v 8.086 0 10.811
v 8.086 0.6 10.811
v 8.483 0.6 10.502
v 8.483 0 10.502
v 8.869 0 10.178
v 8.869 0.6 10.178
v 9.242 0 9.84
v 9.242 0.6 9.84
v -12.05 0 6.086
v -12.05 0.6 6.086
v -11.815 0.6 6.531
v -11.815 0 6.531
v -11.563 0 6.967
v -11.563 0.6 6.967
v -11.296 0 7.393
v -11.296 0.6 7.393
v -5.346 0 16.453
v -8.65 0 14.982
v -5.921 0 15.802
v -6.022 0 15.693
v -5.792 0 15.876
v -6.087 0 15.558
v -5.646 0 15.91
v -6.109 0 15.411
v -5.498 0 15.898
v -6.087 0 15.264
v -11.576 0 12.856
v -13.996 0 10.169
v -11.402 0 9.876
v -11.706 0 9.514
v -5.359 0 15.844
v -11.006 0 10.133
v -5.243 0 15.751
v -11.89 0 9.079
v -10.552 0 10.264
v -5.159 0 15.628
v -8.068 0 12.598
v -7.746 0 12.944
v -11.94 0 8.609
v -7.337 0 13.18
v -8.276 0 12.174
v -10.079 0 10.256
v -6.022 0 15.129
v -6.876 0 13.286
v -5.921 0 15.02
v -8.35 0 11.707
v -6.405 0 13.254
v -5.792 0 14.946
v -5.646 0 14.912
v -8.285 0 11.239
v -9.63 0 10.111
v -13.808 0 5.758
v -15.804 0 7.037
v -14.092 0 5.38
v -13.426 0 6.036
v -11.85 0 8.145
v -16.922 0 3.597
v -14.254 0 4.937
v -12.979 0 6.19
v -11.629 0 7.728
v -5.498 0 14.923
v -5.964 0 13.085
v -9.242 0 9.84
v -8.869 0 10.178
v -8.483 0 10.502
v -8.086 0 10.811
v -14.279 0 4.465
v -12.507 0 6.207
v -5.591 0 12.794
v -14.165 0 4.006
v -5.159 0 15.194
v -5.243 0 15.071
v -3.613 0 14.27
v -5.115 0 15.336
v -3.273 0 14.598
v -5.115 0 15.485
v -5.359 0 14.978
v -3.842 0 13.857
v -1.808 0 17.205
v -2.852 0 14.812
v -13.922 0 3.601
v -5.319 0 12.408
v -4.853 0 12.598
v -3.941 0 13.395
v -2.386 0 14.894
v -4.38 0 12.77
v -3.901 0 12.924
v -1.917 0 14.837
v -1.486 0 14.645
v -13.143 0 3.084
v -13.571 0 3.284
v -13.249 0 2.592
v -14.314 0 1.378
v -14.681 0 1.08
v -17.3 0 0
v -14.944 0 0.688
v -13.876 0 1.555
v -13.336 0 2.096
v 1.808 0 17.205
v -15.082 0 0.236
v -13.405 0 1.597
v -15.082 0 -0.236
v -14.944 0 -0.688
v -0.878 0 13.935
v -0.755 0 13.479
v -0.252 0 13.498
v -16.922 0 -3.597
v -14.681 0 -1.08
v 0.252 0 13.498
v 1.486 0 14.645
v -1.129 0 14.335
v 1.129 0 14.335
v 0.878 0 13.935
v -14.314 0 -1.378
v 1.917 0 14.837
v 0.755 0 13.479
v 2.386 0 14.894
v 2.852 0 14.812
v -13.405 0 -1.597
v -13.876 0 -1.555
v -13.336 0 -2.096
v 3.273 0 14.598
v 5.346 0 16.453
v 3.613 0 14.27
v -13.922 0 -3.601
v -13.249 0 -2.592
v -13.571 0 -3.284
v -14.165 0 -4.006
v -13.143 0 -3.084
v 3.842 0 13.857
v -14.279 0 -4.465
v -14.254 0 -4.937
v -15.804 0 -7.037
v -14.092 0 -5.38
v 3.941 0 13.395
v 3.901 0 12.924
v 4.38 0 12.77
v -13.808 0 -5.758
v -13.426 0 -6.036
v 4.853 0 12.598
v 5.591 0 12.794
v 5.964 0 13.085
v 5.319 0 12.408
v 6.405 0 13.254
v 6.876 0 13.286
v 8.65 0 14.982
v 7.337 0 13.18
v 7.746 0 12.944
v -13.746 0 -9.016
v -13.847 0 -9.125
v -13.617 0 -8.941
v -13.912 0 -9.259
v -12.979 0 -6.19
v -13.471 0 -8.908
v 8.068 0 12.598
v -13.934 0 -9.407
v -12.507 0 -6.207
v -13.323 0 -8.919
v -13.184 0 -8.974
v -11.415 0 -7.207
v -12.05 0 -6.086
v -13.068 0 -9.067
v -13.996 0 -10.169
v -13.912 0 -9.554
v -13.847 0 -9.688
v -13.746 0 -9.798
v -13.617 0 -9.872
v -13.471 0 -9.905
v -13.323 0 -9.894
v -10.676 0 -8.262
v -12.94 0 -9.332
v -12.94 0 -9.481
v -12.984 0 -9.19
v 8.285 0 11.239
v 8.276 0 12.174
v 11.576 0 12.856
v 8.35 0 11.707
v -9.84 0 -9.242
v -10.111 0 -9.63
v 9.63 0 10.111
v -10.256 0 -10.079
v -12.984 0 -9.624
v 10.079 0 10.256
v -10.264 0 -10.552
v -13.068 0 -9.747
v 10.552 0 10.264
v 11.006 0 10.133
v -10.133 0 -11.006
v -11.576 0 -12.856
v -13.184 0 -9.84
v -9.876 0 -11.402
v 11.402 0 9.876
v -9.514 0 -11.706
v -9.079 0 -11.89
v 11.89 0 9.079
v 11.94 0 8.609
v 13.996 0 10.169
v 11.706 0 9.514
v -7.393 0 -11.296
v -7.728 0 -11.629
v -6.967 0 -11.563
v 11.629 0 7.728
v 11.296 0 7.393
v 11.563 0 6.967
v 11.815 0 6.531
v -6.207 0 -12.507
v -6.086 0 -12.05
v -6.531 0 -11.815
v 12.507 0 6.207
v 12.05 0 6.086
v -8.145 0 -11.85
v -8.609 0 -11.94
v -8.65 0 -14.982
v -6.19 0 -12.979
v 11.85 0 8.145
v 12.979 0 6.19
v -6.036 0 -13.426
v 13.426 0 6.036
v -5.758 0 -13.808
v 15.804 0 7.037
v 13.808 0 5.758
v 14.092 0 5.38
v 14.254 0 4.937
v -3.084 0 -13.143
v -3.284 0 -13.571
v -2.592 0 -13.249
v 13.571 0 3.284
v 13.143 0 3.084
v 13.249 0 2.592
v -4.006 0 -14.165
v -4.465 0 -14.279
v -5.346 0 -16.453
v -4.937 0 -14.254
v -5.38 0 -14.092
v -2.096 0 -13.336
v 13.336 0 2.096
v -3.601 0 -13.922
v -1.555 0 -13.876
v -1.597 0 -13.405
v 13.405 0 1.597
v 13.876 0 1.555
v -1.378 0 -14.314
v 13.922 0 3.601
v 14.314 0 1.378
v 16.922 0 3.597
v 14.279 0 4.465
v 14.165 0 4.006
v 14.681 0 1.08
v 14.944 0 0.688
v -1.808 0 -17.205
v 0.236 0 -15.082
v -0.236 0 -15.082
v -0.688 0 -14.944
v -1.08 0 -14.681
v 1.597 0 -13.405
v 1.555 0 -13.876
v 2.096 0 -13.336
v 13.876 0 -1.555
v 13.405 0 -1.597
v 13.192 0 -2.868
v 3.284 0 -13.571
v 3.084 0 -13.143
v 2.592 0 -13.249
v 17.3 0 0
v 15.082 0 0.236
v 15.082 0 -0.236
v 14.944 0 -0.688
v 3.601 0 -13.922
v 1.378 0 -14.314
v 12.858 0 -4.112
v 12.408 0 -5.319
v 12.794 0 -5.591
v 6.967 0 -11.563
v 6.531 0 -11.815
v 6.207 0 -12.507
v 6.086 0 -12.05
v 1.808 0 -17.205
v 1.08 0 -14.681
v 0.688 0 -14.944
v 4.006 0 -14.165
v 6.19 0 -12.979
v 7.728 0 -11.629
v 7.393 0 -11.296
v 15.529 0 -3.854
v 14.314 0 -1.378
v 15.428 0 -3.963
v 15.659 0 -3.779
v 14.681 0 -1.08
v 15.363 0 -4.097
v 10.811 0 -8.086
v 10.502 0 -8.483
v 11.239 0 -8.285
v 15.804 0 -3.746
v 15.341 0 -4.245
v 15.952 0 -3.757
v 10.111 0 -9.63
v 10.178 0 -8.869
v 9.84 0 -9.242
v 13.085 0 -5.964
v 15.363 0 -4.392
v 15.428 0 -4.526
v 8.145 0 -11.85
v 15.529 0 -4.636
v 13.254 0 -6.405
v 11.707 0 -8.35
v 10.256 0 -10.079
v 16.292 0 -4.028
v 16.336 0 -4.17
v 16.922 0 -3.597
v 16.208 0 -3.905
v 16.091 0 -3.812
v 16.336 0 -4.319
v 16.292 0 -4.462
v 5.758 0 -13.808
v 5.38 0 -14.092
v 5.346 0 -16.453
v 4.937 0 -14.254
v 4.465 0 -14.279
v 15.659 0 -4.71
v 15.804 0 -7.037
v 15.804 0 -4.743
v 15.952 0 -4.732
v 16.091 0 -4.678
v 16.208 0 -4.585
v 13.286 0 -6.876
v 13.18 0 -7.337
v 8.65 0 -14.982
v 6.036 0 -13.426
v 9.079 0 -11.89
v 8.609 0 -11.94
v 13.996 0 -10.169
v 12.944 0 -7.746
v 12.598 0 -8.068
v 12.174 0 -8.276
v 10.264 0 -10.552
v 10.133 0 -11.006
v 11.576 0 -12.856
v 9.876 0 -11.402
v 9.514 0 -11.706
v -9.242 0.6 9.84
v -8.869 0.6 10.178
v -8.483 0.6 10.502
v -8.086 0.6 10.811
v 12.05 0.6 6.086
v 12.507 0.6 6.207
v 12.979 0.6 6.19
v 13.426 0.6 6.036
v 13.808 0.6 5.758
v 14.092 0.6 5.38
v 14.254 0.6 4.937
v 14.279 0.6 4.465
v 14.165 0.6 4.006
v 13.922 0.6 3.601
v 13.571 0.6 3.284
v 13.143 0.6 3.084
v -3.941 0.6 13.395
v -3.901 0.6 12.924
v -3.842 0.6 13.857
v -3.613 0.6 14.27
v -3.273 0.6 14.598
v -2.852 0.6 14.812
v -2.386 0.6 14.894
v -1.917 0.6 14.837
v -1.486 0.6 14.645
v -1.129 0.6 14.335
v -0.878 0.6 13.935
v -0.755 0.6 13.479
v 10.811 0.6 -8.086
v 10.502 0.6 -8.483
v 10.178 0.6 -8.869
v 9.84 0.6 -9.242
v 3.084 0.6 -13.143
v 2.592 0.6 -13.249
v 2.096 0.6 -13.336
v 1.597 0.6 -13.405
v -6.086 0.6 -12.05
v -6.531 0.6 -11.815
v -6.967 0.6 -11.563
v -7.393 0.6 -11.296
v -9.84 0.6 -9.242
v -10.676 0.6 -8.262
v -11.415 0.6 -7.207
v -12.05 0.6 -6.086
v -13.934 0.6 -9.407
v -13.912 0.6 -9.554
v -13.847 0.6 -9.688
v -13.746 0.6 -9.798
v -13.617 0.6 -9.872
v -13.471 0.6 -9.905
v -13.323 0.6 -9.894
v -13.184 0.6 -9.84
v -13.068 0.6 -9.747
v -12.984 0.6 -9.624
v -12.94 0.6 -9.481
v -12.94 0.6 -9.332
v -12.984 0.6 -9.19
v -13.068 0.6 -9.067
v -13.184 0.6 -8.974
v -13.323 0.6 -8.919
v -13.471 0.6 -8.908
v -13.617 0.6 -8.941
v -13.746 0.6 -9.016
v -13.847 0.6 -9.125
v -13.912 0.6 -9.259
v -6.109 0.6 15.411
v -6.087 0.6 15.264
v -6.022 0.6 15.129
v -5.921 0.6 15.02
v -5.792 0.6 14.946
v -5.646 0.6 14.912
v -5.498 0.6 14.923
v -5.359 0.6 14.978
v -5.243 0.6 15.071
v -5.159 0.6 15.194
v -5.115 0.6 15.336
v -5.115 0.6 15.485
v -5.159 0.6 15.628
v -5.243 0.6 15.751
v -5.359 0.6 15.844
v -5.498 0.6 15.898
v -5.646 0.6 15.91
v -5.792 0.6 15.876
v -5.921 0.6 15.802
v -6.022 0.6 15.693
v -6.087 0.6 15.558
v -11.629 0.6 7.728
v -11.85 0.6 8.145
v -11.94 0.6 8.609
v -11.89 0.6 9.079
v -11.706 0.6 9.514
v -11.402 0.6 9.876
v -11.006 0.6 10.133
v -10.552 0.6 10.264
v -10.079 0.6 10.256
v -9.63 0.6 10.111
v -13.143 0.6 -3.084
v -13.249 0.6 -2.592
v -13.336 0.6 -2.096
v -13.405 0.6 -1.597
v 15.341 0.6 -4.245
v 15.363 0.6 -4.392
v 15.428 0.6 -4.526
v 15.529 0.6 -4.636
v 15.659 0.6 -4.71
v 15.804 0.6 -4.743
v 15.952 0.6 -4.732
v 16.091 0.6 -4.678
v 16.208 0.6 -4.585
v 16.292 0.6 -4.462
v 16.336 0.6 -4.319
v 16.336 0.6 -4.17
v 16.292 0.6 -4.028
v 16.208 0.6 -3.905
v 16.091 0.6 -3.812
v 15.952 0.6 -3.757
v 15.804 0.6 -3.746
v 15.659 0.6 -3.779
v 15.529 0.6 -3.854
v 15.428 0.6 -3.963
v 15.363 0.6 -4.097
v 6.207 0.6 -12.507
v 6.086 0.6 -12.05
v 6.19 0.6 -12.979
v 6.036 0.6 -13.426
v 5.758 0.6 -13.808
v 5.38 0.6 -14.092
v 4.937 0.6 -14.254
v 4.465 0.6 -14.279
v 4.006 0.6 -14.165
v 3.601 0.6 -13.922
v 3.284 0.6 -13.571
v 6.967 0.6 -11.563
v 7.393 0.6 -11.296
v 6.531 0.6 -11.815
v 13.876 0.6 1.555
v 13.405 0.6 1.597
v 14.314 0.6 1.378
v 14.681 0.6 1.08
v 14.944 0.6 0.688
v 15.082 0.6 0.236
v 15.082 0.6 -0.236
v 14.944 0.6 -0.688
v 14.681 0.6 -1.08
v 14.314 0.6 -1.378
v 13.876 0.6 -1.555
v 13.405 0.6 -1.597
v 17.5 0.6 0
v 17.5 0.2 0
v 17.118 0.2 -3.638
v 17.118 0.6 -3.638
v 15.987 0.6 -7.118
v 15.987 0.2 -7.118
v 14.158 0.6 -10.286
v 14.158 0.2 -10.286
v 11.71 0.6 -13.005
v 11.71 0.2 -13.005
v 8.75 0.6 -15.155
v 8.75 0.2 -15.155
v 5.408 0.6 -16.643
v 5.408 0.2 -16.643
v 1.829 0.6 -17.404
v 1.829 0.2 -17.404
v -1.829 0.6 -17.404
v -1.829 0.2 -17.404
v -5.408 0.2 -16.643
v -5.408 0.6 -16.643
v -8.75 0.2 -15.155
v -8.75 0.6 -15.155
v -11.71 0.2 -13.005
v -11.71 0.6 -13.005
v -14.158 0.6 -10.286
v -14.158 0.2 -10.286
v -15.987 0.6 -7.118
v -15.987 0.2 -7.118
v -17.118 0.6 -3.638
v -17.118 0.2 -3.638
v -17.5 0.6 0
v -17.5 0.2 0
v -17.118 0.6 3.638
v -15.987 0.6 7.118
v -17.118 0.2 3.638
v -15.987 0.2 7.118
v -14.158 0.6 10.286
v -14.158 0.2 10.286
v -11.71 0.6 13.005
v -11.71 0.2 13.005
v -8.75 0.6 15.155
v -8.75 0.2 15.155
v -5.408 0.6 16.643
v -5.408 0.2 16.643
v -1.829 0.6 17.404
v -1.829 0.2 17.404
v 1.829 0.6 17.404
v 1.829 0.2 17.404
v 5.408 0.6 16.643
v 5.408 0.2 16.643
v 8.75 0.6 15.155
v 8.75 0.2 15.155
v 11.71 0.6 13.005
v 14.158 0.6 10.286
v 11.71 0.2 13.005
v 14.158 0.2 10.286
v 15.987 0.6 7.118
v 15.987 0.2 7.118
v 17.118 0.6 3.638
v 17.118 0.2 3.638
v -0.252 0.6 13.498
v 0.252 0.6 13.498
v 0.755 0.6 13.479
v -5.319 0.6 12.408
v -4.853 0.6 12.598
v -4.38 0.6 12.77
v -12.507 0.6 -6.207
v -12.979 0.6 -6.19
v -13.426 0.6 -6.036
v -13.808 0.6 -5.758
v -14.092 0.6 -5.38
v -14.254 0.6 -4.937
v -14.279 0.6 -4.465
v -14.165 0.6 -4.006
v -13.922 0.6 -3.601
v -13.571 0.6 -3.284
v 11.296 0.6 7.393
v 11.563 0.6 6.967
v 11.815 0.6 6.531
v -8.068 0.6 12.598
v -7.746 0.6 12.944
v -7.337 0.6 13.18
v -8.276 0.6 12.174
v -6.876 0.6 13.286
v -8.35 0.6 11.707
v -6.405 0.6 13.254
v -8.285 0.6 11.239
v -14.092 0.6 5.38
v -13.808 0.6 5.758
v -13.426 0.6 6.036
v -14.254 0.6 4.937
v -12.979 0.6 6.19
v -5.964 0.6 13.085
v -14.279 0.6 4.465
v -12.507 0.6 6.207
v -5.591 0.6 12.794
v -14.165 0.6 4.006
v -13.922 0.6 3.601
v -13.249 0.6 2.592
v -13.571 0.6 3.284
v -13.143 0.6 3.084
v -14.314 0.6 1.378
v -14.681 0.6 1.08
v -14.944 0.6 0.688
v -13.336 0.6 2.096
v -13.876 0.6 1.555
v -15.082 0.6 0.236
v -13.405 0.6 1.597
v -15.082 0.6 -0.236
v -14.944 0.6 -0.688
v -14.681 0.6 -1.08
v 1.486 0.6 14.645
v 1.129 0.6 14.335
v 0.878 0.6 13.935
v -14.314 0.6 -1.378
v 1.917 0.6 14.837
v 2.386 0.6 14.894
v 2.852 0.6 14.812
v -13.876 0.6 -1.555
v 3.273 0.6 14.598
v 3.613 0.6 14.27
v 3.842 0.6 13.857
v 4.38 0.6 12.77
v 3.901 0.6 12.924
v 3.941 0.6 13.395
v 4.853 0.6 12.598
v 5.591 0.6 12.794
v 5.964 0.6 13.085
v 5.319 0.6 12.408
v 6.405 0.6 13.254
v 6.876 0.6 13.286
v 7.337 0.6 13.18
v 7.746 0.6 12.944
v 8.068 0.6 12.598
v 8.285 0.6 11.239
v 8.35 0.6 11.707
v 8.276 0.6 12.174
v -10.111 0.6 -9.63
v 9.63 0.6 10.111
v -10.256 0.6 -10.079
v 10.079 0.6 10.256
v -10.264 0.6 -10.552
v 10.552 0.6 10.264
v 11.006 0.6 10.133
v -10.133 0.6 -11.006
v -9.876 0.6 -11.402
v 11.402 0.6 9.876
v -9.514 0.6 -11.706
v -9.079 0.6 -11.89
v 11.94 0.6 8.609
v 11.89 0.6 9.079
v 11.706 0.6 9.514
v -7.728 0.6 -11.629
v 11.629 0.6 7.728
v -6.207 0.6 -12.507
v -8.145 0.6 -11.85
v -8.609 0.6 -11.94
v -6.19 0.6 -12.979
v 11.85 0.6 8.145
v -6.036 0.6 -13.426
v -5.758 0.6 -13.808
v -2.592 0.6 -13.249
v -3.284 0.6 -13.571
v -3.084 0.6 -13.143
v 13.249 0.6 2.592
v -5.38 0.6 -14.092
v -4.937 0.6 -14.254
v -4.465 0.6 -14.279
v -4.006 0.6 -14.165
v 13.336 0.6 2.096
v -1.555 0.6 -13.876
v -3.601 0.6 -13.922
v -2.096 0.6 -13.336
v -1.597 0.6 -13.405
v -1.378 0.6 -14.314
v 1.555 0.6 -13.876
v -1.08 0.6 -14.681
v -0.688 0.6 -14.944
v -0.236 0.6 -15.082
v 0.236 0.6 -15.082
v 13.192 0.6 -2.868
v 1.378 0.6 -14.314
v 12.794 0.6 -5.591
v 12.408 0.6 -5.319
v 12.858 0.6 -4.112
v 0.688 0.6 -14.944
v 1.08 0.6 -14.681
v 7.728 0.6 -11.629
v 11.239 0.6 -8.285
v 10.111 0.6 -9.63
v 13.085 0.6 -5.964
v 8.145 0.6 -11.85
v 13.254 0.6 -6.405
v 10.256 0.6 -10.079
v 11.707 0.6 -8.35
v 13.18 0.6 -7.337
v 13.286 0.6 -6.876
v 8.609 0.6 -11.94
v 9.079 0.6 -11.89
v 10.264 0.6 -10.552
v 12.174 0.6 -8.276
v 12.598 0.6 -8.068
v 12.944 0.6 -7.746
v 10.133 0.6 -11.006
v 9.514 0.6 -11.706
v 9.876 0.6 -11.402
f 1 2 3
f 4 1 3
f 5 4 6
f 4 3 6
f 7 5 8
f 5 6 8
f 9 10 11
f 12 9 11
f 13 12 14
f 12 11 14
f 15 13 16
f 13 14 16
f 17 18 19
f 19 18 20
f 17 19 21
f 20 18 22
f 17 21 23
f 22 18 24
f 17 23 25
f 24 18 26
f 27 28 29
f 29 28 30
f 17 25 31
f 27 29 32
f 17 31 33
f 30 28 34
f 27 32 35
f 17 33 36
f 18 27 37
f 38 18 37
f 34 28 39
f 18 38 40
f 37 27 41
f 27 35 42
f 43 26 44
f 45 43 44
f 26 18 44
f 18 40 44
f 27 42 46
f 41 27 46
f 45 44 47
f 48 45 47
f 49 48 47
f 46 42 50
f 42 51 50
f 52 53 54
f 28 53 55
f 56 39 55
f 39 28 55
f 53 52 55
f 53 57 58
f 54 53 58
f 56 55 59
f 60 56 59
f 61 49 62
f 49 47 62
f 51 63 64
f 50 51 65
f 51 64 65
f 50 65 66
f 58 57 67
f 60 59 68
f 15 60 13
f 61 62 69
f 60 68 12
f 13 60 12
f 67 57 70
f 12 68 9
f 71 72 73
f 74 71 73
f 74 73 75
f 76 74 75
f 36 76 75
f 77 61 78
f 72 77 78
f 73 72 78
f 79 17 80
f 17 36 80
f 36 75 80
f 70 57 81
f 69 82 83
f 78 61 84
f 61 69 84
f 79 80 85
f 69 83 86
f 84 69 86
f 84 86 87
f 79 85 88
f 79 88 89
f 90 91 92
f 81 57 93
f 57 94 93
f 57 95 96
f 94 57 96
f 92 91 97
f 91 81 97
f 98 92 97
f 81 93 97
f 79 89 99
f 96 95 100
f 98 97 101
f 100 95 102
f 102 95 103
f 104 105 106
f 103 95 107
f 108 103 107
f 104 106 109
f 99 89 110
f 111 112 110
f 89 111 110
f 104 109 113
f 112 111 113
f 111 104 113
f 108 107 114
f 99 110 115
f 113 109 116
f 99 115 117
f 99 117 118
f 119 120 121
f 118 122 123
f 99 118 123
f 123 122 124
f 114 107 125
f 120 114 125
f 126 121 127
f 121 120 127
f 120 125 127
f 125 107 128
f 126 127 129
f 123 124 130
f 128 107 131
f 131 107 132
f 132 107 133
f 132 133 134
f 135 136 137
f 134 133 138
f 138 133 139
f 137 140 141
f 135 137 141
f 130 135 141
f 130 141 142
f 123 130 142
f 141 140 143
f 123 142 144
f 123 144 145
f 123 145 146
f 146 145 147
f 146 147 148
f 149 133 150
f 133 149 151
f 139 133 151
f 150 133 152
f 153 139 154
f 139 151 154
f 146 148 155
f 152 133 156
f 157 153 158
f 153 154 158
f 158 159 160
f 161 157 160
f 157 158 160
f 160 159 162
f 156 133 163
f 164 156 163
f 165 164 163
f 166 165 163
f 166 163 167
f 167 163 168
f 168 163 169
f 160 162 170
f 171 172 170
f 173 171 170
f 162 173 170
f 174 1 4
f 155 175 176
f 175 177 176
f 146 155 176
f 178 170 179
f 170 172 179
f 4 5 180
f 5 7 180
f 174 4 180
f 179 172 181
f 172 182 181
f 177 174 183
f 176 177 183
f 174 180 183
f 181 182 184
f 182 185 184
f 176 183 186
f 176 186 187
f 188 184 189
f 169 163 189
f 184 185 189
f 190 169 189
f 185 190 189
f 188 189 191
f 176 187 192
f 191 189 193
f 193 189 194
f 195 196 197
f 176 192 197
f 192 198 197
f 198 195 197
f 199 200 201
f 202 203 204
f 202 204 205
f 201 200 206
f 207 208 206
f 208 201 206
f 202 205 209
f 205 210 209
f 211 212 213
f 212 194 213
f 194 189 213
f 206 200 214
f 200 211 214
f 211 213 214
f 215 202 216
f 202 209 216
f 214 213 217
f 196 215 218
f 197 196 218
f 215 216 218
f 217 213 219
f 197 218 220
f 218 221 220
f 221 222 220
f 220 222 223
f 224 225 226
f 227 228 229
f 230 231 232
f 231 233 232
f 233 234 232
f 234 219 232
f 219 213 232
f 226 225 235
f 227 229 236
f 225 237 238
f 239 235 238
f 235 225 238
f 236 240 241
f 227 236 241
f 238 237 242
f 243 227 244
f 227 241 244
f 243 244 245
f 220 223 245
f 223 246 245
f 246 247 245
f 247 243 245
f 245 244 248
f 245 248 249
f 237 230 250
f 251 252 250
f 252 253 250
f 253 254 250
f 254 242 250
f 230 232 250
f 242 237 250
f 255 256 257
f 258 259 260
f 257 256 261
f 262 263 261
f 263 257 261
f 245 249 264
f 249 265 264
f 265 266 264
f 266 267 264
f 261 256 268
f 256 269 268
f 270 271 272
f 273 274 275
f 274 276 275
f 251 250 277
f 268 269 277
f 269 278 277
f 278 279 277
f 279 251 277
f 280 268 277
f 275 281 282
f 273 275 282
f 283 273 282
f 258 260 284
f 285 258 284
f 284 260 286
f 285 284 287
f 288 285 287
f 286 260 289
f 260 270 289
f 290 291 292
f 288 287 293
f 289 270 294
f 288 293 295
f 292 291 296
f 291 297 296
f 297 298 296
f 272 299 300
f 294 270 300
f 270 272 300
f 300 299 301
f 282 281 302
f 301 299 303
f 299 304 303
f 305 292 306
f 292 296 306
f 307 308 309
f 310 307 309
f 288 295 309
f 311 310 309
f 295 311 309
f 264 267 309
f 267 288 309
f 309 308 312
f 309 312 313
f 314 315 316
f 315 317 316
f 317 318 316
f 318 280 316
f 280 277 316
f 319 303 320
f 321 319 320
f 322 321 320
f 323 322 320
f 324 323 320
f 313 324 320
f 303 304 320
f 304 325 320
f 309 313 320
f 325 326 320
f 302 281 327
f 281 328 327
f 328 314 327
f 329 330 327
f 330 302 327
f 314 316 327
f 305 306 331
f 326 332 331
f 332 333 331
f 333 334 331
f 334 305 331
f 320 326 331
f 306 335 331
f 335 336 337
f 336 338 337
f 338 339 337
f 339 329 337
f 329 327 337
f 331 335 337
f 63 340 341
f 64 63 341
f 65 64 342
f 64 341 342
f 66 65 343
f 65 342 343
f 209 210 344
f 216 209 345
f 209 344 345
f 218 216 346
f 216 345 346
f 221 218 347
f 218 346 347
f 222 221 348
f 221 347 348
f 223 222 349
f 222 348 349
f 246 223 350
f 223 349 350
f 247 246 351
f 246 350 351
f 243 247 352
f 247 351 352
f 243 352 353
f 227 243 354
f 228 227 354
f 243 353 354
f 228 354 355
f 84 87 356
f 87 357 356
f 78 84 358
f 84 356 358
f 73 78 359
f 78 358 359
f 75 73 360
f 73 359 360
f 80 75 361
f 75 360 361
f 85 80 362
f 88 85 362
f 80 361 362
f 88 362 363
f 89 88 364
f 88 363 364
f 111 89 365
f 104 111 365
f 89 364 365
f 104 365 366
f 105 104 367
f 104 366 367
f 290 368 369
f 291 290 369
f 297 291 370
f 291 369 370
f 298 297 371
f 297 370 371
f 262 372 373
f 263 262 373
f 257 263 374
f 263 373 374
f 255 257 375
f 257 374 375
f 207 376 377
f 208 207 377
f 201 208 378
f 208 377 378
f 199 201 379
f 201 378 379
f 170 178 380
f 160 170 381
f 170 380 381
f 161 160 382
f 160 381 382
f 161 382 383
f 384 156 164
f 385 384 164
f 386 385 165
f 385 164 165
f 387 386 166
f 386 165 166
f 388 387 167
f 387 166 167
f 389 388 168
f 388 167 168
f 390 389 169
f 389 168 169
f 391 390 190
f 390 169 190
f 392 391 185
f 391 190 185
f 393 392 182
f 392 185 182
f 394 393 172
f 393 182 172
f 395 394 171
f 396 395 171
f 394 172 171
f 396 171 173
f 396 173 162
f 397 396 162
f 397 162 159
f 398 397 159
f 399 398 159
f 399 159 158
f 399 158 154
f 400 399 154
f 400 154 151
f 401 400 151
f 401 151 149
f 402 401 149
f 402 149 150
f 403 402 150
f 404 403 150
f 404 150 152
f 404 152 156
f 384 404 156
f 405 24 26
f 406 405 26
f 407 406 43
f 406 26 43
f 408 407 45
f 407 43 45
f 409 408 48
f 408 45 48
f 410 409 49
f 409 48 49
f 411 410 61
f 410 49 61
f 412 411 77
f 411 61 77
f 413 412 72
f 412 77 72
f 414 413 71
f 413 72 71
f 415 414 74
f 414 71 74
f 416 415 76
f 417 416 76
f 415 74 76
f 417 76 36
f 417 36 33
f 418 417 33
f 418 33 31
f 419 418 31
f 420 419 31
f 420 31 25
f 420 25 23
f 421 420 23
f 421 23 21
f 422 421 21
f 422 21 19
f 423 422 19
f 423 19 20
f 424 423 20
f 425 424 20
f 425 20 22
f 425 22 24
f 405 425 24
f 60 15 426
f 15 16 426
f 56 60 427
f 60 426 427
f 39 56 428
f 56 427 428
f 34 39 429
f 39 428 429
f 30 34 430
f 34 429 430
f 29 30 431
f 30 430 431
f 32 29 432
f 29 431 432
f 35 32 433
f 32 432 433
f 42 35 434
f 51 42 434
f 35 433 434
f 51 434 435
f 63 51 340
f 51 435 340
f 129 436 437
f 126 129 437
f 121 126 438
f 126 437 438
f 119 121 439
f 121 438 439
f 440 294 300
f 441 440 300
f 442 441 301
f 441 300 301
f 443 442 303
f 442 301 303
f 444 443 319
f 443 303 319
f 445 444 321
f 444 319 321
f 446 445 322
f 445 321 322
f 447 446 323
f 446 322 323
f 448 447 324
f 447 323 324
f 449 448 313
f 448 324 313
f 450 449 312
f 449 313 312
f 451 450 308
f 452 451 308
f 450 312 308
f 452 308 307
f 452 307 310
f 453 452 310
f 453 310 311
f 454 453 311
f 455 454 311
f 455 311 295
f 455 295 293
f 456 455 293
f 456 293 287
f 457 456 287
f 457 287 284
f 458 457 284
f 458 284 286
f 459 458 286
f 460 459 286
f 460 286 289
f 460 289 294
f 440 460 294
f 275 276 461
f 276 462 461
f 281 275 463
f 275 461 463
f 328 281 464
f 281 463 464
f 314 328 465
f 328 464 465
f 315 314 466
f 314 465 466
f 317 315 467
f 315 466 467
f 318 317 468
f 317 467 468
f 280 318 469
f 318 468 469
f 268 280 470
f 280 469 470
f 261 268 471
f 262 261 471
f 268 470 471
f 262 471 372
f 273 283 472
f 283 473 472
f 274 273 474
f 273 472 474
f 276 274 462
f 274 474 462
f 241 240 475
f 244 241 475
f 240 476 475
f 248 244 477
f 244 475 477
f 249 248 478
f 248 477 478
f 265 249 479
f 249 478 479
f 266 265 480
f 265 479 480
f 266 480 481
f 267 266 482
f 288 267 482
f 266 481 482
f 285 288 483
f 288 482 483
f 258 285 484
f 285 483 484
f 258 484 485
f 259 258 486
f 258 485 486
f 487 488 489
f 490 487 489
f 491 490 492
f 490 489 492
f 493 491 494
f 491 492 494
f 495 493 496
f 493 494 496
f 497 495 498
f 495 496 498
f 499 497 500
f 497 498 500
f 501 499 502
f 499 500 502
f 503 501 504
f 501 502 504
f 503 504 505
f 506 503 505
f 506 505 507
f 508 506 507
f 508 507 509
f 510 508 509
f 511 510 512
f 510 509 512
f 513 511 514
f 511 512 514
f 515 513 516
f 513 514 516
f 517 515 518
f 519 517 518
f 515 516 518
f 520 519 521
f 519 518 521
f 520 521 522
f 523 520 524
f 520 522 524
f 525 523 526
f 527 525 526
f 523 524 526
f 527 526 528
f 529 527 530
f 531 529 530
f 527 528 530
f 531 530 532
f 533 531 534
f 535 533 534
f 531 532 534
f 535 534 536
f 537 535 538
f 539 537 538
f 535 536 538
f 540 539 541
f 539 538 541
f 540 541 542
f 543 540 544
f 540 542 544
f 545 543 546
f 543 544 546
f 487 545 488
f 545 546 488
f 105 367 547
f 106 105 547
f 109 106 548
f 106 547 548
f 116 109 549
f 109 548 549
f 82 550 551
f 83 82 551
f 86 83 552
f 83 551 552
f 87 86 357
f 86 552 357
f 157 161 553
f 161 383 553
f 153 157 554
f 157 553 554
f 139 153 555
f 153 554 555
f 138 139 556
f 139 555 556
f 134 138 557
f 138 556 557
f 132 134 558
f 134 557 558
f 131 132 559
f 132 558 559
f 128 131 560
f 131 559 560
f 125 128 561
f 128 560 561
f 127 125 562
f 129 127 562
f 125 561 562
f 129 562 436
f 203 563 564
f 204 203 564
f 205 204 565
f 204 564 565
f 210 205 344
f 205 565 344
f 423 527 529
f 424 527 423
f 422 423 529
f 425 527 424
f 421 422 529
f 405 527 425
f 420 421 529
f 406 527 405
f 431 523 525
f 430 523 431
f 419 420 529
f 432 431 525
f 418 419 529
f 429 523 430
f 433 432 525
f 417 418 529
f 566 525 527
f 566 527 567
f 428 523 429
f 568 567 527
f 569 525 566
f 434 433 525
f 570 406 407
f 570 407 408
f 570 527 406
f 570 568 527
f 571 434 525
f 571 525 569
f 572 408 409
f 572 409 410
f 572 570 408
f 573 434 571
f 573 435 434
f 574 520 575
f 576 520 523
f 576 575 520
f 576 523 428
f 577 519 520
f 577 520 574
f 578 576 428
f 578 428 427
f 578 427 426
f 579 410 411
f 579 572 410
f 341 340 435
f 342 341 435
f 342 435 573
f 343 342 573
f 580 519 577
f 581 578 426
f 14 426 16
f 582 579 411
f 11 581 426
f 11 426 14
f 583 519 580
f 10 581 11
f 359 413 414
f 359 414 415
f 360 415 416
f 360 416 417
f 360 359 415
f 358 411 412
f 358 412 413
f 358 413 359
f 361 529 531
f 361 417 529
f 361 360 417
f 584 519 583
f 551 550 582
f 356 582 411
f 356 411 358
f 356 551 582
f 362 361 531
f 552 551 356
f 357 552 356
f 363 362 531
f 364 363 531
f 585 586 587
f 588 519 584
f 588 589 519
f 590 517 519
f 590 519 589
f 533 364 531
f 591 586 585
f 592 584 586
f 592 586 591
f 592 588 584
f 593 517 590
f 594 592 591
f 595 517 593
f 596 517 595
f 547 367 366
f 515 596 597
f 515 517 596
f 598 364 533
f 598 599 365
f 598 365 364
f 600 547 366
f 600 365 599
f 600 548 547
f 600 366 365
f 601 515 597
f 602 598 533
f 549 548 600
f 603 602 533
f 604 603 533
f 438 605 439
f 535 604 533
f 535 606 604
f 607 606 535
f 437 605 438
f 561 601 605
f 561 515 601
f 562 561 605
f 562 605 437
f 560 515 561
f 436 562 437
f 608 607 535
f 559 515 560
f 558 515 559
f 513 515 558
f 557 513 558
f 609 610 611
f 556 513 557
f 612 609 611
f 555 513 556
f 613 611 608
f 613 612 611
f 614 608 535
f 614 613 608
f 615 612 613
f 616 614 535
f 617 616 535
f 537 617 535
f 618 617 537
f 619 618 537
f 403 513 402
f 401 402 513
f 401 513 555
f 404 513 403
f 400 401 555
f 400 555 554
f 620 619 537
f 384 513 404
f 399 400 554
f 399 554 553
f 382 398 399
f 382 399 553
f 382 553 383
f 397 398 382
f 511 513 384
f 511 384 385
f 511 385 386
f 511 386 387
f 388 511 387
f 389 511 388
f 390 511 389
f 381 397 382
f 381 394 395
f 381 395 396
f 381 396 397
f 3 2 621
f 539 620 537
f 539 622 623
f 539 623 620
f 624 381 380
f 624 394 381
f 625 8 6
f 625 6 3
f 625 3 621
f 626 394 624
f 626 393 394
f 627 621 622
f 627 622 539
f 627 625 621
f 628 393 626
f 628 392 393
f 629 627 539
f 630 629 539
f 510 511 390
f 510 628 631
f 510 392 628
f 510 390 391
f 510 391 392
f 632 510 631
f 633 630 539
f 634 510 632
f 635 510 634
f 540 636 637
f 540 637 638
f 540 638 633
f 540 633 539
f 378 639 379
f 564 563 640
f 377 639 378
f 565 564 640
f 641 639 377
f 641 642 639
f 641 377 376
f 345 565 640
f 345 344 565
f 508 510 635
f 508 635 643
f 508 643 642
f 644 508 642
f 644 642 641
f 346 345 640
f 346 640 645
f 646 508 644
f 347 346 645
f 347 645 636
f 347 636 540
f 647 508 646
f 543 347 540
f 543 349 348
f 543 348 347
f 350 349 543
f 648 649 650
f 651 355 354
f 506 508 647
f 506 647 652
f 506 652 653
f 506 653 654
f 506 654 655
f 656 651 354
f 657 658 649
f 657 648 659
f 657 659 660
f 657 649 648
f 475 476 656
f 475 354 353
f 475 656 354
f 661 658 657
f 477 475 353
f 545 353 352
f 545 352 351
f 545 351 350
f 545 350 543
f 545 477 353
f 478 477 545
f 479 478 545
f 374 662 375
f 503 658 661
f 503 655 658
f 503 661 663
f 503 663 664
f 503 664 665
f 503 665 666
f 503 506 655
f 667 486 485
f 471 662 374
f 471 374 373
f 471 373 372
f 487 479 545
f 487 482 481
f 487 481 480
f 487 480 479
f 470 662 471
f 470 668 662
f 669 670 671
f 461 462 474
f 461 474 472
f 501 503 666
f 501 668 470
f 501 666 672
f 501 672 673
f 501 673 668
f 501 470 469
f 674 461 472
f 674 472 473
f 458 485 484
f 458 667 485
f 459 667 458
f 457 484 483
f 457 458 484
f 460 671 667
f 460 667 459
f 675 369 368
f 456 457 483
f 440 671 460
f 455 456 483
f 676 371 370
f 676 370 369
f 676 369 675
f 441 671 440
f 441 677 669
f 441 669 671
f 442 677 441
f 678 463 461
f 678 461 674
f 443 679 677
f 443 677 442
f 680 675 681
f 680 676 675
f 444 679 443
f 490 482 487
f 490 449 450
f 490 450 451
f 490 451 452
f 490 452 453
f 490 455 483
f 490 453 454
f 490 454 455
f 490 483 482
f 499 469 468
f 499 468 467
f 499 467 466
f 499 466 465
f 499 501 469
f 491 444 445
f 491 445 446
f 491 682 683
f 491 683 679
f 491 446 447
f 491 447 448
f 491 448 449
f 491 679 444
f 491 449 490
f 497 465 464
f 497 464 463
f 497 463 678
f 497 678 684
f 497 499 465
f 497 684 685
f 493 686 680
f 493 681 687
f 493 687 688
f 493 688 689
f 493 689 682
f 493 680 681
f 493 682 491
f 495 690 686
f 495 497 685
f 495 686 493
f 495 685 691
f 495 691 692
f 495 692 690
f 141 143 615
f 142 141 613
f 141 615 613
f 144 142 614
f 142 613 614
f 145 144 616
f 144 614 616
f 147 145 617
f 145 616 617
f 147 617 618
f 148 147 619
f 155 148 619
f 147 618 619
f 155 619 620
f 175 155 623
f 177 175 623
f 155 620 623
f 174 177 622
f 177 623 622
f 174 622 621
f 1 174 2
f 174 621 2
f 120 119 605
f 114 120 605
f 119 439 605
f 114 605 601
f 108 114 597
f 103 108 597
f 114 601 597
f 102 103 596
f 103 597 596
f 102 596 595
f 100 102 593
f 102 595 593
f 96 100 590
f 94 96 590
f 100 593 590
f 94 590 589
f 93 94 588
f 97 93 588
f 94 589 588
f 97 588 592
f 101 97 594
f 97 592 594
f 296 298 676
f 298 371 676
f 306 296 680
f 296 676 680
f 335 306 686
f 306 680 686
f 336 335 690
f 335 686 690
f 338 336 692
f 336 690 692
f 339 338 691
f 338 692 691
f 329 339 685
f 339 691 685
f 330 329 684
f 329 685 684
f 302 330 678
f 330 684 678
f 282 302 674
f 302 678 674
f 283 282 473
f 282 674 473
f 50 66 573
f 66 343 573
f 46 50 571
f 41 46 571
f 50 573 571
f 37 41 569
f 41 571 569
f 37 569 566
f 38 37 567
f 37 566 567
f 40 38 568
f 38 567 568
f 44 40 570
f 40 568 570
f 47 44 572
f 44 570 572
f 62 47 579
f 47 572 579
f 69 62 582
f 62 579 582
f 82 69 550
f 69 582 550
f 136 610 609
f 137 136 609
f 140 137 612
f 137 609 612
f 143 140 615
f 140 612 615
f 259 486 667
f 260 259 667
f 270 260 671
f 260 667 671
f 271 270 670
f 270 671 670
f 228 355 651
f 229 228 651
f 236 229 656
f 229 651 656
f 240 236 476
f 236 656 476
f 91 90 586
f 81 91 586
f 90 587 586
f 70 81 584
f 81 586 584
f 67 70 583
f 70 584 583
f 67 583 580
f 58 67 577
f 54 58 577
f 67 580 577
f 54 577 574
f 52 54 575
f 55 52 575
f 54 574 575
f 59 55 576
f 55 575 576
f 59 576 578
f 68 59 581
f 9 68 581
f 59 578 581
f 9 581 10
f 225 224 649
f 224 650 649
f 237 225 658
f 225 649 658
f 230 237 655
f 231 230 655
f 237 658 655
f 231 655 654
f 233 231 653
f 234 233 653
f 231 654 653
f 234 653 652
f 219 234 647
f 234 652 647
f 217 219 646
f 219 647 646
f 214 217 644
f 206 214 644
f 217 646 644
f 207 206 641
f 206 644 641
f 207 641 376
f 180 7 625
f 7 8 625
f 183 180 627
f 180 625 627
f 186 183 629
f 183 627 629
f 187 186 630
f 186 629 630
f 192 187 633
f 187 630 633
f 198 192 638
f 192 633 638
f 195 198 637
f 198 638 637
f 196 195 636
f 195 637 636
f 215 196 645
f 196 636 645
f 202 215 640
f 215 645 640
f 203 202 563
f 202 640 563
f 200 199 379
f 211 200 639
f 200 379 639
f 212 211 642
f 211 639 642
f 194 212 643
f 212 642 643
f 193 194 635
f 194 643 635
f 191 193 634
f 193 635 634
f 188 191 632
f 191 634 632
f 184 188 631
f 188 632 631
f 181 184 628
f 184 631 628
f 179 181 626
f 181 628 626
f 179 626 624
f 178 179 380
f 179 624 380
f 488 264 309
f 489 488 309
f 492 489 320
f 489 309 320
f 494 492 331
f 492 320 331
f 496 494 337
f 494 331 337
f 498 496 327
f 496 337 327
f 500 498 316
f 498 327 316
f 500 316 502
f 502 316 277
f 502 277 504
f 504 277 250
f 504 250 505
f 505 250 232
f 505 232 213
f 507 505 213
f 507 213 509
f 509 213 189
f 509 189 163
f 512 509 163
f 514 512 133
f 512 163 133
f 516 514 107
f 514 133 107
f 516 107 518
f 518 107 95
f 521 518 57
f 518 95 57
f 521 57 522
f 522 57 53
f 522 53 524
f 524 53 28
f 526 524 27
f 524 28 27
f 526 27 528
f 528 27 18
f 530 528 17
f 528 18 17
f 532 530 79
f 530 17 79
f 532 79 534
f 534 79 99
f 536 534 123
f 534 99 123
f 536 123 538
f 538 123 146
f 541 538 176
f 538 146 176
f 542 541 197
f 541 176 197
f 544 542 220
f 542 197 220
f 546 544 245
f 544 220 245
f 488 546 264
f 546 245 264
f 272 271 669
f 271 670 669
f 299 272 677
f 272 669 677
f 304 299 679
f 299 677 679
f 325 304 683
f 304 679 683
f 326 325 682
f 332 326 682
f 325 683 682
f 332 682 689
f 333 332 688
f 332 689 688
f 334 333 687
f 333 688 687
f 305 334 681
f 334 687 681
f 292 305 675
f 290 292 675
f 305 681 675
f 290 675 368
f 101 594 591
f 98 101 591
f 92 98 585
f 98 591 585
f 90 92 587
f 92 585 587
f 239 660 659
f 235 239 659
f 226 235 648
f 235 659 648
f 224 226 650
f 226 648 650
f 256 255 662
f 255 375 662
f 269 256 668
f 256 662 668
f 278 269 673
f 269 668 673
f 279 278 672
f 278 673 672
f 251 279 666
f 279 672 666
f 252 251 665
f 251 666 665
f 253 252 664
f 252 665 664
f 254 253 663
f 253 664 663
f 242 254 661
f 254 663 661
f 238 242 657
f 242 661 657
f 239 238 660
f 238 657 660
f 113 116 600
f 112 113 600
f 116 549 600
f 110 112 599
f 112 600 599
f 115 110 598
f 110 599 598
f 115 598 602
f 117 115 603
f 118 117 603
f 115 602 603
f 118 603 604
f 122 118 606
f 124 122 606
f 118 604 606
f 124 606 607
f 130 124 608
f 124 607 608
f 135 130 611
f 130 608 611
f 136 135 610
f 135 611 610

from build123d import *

# Parameters (mm, degrees)
SKETCH1_R                    = 17.5
BOSS_EXTRUDE1_DEPTH          = 0.6
CUT_EXTRUDE1_REACH           = 2.6
SKETCH2_R                    = 13.5
SKETCH3_R                    = 1.6
CUT_EXTRUDE2_DEPTH           = 0.6
CIRPATTERN1_COUNT            = 6
CIRPATTERN1_ANGLE            = 100
SKETCH4_R                    = 1.6
CUT_EXTRUDE3_DEPTH           = 0.6
CIRPATTERN2_COUNT            = 11
CIRPATTERN2_ANGLE            = 200
F_1_0_1_DIAMETER_HOLE1_D     = 1
F_1_0_1_DIAMETER_HOLE1_DEPTH = 0.6
CHAMFER1_SIZE                = 0.2


with BuildPart() as part:
    # Sketch1 → Boss-Extrude1 (new body)
    with BuildSketch(Plane(origin=(0, 0, 0), x_dir=(1, 0, 0), z_dir=(0, 1, 0))):
        Circle(SKETCH1_R)
    extrude(amount=BOSS_EXTRUDE1_DEPTH)

    # Sketch2 → Cut-Extrude1 (cut, up to next)
    with BuildSketch(Plane(origin=(0, 0.6, 0), x_dir=(1, 0, 0), z_dir=(0, 1, 0)), mode=Mode.PRIVATE) as cut_extrude1_sk1:
        Circle(SKETCH2_R)
    cut_extrude1_tool1 = extrude(cut_extrude1_sk1.sketch, amount=-CUT_EXTRUDE1_REACH, mode=Mode.PRIVATE) & part.part
    add(cut_extrude1_tool1.solids().sort_by_distance((0, 0.6, 0))[0], mode=Mode.SUBTRACT)

    # Sketch3 → Cut-Extrude2 (cut)
    with BuildSketch(Plane(origin=(0, 0.6, 0), x_dir=(1, 0, 0), z_dir=(0, 1, 0))):
        with Locations((11.691342951, 6.75)):
            Circle(SKETCH3_R)
    cut_extrude2 = extrude(amount=-CUT_EXTRUDE2_DEPTH, mode=Mode.SUBTRACT)

    # CirPattern1: Cut-Extrude2 ×6 about axis
    cirpattern1_axis = Axis((0, 0, 0), (0, 1, 0))
    for i in range(1, CIRPATTERN1_COUNT):
        add(cut_extrude2.rotate(cirpattern1_axis, i * CIRPATTERN1_ANGLE / (CIRPATTERN1_COUNT - 1)), mode=Mode.SUBTRACT)

    # Sketch4 → Cut-Extrude3 (cut)
    with BuildSketch(Plane(origin=(0, 0.6, 0), x_dir=(1, 0, 0), z_dir=(0, 1, 0))):
        with Locations((13.5, 0)):
            Circle(SKETCH4_R)
    cut_extrude3 = extrude(amount=-CUT_EXTRUDE3_DEPTH, mode=Mode.SUBTRACT)

    # CirPattern2: Cut-Extrude3 ×11 about axis
    cirpattern2_axis = Axis((0, 0, 0), (0, -1, 0))
    for i in range(1, CIRPATTERN2_COUNT):
        add(cut_extrude3.rotate(cirpattern2_axis, i * CIRPATTERN2_ANGLE / (CIRPATTERN2_COUNT - 1)), mode=Mode.SUBTRACT)

    # Ø1.0 (1) Diameter Hole1
    with Locations(Plane(origin=(0, 0.6, 0), x_dir=(1, 0, 0), z_dir=(0, 1, 0))):
        with Locations((15.841183551, 4.24463234), (-13.434093526, 9.406653556), (-5.609130351, -15.410958981)):
            Hole(F_1_0_1_DIAMETER_HOLE1_D / 2, depth=F_1_0_1_DIAMETER_HOLE1_DEPTH)

    # Chamfer1
    chamfer1_edges = [part.edges().sort_by_distance(p)[0] for p in [
        (-17.5, 0, 0),
    ]]
    chamfer(chamfer1_edges, length=CHAMFER1_SIZE)


solid = part.part
